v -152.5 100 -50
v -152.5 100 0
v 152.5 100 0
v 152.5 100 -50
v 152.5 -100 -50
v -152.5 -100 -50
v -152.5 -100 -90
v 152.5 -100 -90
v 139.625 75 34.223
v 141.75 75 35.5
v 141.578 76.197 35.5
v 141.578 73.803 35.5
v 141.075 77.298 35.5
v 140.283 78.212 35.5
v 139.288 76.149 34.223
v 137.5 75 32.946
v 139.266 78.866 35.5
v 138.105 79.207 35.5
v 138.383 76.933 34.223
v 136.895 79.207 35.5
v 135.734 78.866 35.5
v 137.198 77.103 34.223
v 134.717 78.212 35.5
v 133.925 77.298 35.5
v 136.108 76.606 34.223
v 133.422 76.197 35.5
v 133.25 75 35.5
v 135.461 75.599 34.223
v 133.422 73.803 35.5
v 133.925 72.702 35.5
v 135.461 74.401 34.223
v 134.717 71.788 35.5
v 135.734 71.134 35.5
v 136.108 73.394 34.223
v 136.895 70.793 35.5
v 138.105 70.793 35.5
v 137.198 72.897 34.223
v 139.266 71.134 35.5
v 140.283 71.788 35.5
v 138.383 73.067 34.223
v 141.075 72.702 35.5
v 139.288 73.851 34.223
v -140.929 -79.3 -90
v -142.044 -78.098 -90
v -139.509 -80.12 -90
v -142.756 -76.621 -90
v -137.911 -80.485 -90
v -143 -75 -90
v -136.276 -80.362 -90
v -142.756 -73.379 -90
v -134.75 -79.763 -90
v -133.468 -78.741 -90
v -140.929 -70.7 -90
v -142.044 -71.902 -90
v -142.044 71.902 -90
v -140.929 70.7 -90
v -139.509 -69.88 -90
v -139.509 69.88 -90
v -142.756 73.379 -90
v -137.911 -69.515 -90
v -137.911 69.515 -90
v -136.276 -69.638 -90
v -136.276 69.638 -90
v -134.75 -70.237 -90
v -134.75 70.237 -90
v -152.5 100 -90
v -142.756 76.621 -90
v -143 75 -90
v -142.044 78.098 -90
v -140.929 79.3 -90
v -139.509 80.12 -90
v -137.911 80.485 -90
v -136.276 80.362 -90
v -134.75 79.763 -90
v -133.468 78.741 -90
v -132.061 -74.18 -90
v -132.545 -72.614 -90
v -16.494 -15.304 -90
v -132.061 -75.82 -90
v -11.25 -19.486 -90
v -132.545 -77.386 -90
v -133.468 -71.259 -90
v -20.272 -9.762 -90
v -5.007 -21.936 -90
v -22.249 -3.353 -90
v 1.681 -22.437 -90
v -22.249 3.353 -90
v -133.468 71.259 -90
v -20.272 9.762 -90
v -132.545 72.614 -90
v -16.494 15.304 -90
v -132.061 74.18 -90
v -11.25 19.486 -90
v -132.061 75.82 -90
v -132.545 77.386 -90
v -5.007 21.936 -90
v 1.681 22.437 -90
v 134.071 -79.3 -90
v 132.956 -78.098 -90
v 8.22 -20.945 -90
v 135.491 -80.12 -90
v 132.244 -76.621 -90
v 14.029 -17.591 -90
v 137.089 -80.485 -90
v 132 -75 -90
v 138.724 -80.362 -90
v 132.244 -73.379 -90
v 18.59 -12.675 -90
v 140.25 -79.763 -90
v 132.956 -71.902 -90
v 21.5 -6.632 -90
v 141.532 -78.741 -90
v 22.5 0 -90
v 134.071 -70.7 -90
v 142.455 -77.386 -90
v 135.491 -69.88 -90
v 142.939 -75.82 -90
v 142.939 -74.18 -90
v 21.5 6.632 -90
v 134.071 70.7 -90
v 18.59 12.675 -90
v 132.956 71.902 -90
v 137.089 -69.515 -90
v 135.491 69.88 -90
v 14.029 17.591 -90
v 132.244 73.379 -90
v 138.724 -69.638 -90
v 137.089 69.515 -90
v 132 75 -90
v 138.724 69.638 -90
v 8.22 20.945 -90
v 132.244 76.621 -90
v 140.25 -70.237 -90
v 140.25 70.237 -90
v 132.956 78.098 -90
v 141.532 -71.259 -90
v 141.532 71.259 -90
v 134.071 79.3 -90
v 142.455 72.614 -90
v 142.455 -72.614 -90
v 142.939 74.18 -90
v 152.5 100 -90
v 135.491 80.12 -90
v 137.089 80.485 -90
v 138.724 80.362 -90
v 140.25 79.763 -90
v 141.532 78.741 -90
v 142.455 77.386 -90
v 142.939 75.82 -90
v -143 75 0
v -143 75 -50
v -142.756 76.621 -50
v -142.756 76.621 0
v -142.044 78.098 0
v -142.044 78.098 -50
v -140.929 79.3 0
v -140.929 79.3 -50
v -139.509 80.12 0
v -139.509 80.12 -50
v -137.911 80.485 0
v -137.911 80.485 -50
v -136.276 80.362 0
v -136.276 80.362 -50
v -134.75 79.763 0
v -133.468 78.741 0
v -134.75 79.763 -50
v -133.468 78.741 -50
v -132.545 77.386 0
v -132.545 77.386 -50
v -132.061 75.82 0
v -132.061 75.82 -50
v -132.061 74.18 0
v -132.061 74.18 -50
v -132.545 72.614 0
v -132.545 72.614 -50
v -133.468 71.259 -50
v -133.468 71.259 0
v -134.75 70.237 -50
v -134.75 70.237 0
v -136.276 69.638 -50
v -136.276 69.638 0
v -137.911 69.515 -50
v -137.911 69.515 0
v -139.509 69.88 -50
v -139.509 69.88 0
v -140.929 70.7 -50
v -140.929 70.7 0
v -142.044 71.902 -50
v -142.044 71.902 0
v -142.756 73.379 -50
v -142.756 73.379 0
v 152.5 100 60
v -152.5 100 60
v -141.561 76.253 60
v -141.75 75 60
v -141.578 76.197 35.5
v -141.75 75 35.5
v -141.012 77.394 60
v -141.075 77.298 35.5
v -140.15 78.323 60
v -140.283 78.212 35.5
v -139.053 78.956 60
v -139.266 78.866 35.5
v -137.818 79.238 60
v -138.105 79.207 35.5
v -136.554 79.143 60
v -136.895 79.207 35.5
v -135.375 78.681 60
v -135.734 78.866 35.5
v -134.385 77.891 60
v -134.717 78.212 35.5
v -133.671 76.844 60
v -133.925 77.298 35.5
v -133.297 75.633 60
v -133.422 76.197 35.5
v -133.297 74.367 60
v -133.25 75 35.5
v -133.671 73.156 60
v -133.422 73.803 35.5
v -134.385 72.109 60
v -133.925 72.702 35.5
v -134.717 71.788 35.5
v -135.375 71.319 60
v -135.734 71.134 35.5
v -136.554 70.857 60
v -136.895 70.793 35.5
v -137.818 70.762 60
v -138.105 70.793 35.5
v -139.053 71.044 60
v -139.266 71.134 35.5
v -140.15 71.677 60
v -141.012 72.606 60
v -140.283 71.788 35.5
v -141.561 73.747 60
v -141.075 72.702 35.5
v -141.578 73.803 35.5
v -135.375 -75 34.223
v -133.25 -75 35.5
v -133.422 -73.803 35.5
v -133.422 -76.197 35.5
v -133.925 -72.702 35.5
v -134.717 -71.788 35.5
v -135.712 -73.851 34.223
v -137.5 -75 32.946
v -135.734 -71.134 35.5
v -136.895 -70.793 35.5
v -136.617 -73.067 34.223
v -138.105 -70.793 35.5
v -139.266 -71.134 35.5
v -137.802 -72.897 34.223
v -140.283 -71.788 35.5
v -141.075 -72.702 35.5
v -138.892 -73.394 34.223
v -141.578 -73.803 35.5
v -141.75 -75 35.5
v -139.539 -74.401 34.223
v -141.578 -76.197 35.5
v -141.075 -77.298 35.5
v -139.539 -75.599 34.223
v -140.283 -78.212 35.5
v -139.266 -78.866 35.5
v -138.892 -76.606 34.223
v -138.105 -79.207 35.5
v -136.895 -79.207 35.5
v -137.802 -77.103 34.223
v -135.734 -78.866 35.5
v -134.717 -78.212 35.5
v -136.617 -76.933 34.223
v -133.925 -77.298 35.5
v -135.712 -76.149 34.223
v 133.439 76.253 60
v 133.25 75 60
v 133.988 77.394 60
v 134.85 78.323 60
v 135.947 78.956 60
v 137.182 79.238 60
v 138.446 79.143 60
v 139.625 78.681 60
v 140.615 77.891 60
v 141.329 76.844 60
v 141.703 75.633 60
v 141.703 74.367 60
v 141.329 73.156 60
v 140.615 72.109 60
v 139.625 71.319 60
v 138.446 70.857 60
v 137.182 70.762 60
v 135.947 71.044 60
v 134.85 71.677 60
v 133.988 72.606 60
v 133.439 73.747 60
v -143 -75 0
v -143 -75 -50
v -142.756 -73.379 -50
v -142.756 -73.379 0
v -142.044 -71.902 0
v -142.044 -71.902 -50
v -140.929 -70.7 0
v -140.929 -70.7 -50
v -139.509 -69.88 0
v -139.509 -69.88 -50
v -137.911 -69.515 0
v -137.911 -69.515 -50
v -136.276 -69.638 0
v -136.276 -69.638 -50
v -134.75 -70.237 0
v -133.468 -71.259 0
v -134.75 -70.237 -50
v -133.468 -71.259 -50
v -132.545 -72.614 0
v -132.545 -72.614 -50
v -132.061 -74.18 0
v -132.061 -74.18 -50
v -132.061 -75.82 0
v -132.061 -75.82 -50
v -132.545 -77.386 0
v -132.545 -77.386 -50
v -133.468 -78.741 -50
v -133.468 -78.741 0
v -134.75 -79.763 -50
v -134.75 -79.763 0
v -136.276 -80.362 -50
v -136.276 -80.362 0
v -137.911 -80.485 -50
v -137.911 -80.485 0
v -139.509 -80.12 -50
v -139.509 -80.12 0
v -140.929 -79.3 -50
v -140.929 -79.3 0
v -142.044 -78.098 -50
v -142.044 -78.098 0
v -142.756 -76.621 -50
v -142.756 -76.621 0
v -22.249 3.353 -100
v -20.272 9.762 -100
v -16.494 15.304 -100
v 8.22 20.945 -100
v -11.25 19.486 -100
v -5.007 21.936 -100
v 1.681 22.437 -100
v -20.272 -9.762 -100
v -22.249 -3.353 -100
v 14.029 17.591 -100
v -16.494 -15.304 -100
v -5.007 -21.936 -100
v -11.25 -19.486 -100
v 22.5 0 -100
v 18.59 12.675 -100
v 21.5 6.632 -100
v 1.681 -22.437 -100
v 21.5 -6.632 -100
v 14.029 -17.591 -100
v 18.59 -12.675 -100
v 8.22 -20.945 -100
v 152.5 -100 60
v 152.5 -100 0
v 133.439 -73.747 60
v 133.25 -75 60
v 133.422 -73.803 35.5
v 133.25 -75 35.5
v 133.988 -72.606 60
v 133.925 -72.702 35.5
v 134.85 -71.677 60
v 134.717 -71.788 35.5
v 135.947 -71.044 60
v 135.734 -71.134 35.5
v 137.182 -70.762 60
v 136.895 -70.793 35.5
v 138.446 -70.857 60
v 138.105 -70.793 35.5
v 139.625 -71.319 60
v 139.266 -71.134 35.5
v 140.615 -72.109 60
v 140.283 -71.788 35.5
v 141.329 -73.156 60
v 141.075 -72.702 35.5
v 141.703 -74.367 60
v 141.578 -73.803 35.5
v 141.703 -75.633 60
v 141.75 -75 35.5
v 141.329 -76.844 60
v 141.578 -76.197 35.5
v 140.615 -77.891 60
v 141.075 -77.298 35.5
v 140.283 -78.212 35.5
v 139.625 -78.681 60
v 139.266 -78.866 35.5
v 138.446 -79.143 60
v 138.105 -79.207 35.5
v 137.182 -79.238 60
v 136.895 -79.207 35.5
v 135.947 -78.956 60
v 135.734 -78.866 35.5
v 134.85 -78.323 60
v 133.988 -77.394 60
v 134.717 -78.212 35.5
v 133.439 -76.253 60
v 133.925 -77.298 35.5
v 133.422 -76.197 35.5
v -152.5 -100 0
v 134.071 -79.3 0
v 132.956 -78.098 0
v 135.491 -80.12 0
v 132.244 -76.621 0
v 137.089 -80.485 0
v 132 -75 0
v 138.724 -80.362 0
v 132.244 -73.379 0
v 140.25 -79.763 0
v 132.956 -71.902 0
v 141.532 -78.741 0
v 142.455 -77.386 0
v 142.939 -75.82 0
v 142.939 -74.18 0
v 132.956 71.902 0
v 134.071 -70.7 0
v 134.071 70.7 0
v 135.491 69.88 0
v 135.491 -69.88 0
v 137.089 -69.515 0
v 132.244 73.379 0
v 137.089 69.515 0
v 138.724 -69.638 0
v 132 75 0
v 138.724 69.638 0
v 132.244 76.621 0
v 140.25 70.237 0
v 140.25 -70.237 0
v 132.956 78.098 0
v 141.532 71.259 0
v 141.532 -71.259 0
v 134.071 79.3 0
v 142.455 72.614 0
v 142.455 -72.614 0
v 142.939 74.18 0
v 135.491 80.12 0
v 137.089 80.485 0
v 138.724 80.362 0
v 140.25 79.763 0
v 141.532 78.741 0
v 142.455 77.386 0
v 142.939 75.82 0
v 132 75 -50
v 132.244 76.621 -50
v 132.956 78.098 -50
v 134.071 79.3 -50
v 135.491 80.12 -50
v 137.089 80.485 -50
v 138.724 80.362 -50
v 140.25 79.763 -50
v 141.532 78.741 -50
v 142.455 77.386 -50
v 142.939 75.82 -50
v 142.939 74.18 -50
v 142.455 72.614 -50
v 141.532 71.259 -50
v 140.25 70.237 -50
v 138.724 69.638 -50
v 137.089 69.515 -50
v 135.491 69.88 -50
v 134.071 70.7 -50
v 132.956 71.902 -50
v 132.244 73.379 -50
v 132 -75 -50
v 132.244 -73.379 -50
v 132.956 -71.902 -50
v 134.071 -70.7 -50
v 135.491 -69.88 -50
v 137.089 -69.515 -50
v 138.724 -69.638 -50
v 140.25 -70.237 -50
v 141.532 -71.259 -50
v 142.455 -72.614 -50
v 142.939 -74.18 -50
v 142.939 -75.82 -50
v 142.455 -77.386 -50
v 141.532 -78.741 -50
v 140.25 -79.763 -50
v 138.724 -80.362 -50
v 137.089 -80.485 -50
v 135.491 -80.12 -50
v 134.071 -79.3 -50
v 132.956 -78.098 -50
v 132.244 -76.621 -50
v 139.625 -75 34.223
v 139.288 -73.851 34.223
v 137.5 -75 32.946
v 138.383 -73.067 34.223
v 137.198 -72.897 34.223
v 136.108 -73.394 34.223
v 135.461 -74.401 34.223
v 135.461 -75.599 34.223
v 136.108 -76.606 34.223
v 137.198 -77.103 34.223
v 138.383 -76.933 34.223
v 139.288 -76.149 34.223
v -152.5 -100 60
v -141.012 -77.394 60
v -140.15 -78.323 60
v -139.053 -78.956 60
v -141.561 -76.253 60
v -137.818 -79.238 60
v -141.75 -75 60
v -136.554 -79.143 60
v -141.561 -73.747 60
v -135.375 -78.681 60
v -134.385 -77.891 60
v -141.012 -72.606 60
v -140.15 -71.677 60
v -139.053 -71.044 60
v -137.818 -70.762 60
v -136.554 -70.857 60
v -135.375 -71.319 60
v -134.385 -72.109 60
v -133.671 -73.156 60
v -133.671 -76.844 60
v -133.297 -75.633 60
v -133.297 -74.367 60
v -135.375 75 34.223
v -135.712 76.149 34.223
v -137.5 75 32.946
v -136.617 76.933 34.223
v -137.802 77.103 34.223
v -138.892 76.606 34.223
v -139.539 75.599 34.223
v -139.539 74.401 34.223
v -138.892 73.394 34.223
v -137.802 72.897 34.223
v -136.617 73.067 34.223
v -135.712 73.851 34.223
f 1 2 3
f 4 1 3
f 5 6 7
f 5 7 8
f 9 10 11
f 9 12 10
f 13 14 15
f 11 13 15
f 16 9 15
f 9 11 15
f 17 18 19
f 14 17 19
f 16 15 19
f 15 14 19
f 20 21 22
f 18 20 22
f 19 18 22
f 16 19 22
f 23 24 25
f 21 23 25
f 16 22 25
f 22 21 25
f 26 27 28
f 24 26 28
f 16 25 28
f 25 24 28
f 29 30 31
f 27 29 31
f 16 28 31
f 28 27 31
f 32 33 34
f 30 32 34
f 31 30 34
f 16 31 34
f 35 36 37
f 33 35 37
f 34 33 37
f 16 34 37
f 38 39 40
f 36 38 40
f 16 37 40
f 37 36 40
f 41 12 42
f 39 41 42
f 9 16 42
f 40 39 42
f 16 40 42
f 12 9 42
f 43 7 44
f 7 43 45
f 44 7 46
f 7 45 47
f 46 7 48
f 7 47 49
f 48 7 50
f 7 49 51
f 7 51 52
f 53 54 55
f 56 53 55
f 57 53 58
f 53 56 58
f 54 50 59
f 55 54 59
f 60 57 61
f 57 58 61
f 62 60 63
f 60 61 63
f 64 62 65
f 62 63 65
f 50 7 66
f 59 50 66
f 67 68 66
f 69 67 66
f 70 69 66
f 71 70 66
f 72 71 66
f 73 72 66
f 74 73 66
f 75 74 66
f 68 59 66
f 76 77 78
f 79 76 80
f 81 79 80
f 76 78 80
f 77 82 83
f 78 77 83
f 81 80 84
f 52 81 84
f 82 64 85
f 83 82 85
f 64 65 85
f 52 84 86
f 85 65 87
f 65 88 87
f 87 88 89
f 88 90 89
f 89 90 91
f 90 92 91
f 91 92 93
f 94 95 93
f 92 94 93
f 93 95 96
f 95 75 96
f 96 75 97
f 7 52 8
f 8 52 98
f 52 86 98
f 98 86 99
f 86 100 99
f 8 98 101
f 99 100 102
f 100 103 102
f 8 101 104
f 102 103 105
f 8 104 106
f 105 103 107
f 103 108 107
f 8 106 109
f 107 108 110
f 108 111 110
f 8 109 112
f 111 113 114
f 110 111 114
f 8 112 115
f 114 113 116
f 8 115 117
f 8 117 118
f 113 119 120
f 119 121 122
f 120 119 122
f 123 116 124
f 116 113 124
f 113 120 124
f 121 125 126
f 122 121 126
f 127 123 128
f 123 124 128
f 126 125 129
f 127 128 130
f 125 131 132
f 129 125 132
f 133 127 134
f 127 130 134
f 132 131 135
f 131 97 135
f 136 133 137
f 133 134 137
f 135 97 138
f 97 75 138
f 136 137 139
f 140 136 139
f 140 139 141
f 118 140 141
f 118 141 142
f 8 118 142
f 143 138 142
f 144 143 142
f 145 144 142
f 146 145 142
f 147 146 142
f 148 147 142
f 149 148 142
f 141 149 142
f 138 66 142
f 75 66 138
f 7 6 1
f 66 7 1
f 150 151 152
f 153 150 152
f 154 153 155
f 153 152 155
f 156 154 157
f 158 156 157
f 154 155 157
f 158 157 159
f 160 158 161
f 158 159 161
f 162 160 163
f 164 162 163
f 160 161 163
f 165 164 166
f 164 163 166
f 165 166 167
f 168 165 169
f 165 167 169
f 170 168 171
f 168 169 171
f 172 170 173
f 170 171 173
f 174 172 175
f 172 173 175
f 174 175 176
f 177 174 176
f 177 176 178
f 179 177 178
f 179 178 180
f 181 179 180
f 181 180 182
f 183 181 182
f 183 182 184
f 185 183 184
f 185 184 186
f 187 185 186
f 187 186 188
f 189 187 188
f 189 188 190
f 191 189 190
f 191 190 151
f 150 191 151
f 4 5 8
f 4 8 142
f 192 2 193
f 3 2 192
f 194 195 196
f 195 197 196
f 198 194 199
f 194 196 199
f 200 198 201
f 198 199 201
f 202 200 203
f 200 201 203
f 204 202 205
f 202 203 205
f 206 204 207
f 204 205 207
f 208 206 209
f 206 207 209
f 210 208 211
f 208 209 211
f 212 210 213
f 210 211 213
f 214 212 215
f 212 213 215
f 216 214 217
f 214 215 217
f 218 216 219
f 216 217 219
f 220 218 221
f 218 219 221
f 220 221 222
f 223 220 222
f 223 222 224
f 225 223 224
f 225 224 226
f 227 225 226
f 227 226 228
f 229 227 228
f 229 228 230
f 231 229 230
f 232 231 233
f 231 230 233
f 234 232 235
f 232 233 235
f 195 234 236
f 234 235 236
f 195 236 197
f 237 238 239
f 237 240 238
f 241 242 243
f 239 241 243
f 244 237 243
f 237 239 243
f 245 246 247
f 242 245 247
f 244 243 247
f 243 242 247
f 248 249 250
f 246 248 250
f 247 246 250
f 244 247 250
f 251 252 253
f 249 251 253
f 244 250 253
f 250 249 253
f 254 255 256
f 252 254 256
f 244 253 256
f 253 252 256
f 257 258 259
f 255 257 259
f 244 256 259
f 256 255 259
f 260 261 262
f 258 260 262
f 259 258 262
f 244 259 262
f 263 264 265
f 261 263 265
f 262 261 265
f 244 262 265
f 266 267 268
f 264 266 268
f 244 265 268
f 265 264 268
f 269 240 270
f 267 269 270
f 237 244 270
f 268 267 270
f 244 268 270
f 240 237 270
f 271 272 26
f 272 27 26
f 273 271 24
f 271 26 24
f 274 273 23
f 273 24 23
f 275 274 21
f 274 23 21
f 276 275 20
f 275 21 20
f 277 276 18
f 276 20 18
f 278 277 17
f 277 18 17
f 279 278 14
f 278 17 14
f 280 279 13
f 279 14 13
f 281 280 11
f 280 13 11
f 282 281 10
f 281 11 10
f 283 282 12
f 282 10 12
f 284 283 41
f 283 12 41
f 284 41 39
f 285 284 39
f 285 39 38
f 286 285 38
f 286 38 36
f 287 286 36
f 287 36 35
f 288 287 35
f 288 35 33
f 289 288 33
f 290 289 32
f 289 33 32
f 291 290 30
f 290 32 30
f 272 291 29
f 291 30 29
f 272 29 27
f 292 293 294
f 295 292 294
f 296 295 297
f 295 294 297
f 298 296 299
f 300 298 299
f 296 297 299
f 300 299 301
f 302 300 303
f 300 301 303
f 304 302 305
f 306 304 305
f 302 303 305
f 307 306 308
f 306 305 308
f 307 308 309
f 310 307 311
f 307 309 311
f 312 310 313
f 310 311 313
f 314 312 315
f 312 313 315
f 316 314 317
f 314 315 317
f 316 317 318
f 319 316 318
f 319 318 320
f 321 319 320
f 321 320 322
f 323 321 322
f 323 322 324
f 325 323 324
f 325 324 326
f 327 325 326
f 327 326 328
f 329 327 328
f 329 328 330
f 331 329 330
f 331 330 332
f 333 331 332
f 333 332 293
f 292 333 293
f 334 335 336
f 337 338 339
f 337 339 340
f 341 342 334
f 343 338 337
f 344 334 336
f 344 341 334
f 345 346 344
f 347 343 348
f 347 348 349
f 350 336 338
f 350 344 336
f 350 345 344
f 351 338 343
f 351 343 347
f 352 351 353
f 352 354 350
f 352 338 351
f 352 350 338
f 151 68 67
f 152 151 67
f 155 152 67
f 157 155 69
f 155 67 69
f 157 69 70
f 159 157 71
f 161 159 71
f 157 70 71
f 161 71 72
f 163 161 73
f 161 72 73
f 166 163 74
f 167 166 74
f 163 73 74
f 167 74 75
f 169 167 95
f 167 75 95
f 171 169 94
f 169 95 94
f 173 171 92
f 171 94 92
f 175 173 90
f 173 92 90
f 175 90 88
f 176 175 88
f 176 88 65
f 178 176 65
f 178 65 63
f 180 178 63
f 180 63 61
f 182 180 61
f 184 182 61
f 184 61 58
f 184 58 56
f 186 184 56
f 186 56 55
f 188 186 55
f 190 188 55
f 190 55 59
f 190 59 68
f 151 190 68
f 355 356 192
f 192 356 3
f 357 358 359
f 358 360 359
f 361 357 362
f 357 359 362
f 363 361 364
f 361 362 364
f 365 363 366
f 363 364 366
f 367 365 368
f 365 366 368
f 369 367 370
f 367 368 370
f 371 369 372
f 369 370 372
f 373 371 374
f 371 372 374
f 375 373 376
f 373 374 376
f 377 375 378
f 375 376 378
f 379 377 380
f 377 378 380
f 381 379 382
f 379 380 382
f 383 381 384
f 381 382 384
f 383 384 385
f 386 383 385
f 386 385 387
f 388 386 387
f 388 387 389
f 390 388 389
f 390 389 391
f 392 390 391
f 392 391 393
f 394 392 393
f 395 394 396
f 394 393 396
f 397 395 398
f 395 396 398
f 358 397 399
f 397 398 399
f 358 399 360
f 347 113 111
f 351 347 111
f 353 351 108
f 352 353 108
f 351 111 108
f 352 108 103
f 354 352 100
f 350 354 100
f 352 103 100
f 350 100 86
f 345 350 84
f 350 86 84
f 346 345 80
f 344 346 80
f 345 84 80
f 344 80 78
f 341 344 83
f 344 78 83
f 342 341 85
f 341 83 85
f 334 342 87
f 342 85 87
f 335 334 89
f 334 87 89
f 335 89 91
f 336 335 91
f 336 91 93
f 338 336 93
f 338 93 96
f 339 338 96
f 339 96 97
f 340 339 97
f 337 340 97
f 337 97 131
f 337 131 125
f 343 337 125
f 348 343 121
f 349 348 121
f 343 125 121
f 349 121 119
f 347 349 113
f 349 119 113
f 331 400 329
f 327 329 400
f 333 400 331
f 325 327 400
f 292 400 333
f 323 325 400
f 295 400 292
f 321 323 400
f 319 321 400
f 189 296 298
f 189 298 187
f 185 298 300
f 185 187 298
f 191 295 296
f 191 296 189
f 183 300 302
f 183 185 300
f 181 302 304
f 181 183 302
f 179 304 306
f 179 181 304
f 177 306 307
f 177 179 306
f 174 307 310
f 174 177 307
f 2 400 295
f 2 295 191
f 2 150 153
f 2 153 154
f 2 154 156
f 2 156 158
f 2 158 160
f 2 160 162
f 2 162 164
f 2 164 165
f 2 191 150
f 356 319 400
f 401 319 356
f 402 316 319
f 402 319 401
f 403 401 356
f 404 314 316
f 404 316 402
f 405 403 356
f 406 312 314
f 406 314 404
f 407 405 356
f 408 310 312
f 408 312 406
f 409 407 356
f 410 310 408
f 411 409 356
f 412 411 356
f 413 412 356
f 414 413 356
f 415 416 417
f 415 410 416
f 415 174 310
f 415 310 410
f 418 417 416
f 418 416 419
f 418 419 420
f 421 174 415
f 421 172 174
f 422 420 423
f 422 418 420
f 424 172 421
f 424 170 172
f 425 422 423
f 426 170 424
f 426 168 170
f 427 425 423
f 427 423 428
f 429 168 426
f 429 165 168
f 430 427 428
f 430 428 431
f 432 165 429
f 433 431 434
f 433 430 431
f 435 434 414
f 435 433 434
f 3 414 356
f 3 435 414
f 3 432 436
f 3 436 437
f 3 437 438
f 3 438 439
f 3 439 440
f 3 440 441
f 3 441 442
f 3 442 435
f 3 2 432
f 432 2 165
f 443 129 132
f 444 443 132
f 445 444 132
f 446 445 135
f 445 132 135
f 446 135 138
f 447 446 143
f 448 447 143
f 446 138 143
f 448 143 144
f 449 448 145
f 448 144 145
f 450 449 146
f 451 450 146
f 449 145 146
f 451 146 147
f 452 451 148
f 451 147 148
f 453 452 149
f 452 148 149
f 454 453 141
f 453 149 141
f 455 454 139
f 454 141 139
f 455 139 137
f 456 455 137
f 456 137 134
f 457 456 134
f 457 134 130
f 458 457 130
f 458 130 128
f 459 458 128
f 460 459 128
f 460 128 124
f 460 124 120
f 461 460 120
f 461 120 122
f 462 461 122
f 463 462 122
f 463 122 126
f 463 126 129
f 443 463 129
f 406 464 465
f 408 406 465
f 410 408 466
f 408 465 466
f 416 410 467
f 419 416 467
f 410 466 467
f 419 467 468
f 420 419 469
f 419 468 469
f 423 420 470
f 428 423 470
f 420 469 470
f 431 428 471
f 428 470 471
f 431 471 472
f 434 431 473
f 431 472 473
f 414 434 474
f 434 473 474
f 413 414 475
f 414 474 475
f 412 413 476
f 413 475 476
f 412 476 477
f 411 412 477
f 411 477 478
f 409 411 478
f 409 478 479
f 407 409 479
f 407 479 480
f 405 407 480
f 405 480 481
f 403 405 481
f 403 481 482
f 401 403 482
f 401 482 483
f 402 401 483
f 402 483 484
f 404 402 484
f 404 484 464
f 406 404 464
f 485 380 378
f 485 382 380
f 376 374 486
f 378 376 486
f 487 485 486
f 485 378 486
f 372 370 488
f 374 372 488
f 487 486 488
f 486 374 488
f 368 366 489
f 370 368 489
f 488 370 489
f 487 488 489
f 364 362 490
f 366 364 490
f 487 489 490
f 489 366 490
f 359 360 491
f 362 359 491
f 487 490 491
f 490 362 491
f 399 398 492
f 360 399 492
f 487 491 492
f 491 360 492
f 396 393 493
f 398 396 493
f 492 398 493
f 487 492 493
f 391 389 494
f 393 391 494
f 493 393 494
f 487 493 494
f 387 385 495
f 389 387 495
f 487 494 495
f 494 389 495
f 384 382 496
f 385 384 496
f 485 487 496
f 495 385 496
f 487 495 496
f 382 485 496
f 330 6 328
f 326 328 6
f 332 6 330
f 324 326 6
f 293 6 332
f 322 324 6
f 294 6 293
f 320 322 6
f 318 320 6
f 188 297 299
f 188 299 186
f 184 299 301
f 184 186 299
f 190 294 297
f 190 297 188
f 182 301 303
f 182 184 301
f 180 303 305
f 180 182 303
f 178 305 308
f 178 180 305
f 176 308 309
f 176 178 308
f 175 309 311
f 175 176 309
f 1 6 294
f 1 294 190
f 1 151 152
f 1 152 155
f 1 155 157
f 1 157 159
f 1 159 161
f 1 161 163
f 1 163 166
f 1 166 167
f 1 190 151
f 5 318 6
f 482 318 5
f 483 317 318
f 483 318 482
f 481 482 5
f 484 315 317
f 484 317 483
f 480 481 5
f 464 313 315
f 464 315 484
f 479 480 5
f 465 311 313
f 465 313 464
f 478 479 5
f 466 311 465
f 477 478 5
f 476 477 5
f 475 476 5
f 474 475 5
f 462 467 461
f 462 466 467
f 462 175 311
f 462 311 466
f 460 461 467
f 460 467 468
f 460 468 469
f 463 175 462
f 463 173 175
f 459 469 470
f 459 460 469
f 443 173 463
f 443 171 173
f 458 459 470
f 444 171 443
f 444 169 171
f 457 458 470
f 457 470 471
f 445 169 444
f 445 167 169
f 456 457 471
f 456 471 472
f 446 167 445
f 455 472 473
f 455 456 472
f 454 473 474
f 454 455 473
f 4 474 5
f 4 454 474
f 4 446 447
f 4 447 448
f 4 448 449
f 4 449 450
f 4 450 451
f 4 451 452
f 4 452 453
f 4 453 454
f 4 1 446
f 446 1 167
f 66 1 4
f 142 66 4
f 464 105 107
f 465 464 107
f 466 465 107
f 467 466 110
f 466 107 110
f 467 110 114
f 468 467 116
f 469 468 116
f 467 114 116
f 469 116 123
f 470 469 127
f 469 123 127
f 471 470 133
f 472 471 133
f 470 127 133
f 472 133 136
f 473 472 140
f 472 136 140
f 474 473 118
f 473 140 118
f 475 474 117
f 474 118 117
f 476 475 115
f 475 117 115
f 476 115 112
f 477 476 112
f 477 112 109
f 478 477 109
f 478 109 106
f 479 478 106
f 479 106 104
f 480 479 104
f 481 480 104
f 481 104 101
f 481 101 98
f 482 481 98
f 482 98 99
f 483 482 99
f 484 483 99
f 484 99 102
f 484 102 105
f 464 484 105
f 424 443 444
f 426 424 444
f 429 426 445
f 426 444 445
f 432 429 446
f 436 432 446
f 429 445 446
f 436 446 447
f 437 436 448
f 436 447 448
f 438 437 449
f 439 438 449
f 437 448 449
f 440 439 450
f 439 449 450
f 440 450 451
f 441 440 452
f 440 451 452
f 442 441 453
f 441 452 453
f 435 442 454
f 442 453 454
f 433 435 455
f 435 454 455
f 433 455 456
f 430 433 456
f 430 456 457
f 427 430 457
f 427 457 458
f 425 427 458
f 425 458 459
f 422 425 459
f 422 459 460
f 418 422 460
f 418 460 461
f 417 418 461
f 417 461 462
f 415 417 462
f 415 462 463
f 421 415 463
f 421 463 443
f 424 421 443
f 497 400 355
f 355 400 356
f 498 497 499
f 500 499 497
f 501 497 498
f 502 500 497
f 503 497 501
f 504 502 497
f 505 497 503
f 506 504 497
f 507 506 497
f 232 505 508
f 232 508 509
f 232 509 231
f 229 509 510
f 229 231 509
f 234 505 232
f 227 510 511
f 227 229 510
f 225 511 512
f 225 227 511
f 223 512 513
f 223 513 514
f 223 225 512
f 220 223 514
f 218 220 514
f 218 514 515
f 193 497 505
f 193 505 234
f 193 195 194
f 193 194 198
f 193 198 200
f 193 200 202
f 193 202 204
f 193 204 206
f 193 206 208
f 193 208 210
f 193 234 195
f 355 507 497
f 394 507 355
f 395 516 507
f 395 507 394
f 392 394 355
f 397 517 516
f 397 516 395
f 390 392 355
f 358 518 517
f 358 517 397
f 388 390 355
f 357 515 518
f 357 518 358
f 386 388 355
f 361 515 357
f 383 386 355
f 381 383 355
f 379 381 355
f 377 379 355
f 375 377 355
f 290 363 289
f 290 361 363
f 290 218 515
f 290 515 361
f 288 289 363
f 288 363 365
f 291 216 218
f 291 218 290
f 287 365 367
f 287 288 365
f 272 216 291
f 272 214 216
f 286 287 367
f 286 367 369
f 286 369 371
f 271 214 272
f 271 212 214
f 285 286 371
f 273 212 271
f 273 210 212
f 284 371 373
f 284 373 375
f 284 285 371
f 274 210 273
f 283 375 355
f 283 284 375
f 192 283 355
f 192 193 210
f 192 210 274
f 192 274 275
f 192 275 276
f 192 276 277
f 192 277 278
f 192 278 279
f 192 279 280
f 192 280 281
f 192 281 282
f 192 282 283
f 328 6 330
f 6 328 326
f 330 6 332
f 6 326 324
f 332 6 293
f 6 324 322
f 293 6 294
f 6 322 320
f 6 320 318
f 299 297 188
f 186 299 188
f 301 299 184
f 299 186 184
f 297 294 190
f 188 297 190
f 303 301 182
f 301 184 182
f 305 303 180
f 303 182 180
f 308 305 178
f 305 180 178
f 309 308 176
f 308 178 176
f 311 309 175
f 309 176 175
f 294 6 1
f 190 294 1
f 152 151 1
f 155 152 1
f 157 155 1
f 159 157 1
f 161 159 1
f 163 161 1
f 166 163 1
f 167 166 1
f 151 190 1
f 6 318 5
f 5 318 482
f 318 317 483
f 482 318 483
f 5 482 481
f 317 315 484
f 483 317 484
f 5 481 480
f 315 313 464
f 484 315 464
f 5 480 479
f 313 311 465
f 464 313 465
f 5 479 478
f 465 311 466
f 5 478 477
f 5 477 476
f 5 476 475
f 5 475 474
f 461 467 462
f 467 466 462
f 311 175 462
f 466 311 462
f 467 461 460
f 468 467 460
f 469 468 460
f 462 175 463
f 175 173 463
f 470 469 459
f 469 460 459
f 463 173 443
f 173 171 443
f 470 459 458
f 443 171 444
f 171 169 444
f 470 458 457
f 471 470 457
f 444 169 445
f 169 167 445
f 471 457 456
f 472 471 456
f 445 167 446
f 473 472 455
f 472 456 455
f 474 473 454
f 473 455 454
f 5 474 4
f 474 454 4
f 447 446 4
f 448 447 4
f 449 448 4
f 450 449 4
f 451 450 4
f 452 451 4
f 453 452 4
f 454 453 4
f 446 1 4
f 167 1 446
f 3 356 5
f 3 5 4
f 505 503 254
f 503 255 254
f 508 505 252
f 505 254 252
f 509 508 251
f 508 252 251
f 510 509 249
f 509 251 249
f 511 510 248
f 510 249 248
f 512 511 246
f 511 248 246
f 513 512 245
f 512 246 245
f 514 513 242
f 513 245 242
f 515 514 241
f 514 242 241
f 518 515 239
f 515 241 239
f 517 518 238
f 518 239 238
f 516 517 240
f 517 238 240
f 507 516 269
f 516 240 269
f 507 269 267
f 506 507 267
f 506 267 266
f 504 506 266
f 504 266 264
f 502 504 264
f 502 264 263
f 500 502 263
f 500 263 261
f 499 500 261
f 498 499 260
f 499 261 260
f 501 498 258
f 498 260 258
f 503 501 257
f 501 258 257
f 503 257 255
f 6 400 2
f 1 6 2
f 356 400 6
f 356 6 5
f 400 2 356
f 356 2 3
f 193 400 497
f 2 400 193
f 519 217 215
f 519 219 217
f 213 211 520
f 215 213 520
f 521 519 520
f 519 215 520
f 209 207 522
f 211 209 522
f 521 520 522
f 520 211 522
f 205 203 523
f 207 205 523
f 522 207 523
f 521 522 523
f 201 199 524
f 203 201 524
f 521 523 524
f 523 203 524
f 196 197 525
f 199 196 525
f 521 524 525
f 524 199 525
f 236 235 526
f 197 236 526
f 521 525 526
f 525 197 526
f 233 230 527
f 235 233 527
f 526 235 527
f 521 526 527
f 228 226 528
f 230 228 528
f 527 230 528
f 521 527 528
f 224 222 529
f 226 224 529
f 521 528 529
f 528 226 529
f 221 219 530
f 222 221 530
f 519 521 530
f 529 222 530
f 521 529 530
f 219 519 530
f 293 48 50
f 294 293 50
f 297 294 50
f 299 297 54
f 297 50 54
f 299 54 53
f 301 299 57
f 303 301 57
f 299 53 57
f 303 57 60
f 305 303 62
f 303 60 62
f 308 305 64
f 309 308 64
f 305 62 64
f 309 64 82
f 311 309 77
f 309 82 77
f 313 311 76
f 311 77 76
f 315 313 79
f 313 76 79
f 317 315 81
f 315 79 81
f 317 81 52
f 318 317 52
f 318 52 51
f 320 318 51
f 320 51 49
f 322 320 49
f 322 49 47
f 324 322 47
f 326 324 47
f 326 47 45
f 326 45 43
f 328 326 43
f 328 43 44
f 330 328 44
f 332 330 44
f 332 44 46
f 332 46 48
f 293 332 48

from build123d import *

# Parameters (mm, degrees)
F3_W      = 305
F3_H      = 200
F4_DEPTH  = 60
F6_D      = 8.5
F6_DEPTH  = 24.5
F6_TIP    = 2.5536576309
F7_DEPTH  = 50
F8_DEPTH  = 40
F9_R      = 22.5
F10_DEPTH = 10
F12_D     = 11
F12_2_D   = 11


with BuildPart() as f4:
    # F3 (on Top) → F4 (new body)
    with BuildSketch(Plane.XY):
        Rectangle(F3_W, F3_H)
    extrude(amount=F4_DEPTH)

    # F6
    with Locations(Plane.XY.offset(60)):
        with Locations((-137.5, 75), (137.5, 75), (-137.5, -75), (137.5, -75)):
            Hole(F6_D / 2, depth=F6_DEPTH)
            with Locations((0, 0, -(F6_DEPTH + F6_TIP / 2))):  # 118° drill point
                Cone(0, F6_D / 2, F6_TIP, mode=Mode.SUBTRACT)


with BuildPart() as f7:
    # F3 (on Top) → F7 (new body)
    with BuildSketch(Plane.XY):
        Rectangle(F3_W, F3_H)
    extrude(amount=-F7_DEPTH)


with BuildPart() as f8:
    # F8 (new): a face of the model
    f8_faces = [f7.part.faces().sort_by_distance(p)[0] for p in [
        (0, 0, -50),
    ]]
    extrude(f8_faces, amount=F8_DEPTH)

    # F9 (on face) → F10 (join)
    with BuildSketch(Plane(origin=(0, 0, -90), x_dir=(1, 0, 0), z_dir=(0, 0, -1))):
        Circle(F9_R)
    extrude(amount=F10_DEPTH)

    # F12#2 (through all)
    with Locations(Plane.XY):
        with Locations((-137.5, -75), (-137.5, 75), (137.5, 75), (137.5, -75)):
            Hole(F12_2_D / 2)


with BuildPart() as f7_1:
    add(f7.part)

    # F12 (through all)
    with Locations(Plane.XY):
        with Locations((-137.5, -75), (-137.5, 75), (137.5, 75), (137.5, -75)):
            Hole(F12_D / 2)


solid = Compound([f4.part, f8.part, f7_1.part])
